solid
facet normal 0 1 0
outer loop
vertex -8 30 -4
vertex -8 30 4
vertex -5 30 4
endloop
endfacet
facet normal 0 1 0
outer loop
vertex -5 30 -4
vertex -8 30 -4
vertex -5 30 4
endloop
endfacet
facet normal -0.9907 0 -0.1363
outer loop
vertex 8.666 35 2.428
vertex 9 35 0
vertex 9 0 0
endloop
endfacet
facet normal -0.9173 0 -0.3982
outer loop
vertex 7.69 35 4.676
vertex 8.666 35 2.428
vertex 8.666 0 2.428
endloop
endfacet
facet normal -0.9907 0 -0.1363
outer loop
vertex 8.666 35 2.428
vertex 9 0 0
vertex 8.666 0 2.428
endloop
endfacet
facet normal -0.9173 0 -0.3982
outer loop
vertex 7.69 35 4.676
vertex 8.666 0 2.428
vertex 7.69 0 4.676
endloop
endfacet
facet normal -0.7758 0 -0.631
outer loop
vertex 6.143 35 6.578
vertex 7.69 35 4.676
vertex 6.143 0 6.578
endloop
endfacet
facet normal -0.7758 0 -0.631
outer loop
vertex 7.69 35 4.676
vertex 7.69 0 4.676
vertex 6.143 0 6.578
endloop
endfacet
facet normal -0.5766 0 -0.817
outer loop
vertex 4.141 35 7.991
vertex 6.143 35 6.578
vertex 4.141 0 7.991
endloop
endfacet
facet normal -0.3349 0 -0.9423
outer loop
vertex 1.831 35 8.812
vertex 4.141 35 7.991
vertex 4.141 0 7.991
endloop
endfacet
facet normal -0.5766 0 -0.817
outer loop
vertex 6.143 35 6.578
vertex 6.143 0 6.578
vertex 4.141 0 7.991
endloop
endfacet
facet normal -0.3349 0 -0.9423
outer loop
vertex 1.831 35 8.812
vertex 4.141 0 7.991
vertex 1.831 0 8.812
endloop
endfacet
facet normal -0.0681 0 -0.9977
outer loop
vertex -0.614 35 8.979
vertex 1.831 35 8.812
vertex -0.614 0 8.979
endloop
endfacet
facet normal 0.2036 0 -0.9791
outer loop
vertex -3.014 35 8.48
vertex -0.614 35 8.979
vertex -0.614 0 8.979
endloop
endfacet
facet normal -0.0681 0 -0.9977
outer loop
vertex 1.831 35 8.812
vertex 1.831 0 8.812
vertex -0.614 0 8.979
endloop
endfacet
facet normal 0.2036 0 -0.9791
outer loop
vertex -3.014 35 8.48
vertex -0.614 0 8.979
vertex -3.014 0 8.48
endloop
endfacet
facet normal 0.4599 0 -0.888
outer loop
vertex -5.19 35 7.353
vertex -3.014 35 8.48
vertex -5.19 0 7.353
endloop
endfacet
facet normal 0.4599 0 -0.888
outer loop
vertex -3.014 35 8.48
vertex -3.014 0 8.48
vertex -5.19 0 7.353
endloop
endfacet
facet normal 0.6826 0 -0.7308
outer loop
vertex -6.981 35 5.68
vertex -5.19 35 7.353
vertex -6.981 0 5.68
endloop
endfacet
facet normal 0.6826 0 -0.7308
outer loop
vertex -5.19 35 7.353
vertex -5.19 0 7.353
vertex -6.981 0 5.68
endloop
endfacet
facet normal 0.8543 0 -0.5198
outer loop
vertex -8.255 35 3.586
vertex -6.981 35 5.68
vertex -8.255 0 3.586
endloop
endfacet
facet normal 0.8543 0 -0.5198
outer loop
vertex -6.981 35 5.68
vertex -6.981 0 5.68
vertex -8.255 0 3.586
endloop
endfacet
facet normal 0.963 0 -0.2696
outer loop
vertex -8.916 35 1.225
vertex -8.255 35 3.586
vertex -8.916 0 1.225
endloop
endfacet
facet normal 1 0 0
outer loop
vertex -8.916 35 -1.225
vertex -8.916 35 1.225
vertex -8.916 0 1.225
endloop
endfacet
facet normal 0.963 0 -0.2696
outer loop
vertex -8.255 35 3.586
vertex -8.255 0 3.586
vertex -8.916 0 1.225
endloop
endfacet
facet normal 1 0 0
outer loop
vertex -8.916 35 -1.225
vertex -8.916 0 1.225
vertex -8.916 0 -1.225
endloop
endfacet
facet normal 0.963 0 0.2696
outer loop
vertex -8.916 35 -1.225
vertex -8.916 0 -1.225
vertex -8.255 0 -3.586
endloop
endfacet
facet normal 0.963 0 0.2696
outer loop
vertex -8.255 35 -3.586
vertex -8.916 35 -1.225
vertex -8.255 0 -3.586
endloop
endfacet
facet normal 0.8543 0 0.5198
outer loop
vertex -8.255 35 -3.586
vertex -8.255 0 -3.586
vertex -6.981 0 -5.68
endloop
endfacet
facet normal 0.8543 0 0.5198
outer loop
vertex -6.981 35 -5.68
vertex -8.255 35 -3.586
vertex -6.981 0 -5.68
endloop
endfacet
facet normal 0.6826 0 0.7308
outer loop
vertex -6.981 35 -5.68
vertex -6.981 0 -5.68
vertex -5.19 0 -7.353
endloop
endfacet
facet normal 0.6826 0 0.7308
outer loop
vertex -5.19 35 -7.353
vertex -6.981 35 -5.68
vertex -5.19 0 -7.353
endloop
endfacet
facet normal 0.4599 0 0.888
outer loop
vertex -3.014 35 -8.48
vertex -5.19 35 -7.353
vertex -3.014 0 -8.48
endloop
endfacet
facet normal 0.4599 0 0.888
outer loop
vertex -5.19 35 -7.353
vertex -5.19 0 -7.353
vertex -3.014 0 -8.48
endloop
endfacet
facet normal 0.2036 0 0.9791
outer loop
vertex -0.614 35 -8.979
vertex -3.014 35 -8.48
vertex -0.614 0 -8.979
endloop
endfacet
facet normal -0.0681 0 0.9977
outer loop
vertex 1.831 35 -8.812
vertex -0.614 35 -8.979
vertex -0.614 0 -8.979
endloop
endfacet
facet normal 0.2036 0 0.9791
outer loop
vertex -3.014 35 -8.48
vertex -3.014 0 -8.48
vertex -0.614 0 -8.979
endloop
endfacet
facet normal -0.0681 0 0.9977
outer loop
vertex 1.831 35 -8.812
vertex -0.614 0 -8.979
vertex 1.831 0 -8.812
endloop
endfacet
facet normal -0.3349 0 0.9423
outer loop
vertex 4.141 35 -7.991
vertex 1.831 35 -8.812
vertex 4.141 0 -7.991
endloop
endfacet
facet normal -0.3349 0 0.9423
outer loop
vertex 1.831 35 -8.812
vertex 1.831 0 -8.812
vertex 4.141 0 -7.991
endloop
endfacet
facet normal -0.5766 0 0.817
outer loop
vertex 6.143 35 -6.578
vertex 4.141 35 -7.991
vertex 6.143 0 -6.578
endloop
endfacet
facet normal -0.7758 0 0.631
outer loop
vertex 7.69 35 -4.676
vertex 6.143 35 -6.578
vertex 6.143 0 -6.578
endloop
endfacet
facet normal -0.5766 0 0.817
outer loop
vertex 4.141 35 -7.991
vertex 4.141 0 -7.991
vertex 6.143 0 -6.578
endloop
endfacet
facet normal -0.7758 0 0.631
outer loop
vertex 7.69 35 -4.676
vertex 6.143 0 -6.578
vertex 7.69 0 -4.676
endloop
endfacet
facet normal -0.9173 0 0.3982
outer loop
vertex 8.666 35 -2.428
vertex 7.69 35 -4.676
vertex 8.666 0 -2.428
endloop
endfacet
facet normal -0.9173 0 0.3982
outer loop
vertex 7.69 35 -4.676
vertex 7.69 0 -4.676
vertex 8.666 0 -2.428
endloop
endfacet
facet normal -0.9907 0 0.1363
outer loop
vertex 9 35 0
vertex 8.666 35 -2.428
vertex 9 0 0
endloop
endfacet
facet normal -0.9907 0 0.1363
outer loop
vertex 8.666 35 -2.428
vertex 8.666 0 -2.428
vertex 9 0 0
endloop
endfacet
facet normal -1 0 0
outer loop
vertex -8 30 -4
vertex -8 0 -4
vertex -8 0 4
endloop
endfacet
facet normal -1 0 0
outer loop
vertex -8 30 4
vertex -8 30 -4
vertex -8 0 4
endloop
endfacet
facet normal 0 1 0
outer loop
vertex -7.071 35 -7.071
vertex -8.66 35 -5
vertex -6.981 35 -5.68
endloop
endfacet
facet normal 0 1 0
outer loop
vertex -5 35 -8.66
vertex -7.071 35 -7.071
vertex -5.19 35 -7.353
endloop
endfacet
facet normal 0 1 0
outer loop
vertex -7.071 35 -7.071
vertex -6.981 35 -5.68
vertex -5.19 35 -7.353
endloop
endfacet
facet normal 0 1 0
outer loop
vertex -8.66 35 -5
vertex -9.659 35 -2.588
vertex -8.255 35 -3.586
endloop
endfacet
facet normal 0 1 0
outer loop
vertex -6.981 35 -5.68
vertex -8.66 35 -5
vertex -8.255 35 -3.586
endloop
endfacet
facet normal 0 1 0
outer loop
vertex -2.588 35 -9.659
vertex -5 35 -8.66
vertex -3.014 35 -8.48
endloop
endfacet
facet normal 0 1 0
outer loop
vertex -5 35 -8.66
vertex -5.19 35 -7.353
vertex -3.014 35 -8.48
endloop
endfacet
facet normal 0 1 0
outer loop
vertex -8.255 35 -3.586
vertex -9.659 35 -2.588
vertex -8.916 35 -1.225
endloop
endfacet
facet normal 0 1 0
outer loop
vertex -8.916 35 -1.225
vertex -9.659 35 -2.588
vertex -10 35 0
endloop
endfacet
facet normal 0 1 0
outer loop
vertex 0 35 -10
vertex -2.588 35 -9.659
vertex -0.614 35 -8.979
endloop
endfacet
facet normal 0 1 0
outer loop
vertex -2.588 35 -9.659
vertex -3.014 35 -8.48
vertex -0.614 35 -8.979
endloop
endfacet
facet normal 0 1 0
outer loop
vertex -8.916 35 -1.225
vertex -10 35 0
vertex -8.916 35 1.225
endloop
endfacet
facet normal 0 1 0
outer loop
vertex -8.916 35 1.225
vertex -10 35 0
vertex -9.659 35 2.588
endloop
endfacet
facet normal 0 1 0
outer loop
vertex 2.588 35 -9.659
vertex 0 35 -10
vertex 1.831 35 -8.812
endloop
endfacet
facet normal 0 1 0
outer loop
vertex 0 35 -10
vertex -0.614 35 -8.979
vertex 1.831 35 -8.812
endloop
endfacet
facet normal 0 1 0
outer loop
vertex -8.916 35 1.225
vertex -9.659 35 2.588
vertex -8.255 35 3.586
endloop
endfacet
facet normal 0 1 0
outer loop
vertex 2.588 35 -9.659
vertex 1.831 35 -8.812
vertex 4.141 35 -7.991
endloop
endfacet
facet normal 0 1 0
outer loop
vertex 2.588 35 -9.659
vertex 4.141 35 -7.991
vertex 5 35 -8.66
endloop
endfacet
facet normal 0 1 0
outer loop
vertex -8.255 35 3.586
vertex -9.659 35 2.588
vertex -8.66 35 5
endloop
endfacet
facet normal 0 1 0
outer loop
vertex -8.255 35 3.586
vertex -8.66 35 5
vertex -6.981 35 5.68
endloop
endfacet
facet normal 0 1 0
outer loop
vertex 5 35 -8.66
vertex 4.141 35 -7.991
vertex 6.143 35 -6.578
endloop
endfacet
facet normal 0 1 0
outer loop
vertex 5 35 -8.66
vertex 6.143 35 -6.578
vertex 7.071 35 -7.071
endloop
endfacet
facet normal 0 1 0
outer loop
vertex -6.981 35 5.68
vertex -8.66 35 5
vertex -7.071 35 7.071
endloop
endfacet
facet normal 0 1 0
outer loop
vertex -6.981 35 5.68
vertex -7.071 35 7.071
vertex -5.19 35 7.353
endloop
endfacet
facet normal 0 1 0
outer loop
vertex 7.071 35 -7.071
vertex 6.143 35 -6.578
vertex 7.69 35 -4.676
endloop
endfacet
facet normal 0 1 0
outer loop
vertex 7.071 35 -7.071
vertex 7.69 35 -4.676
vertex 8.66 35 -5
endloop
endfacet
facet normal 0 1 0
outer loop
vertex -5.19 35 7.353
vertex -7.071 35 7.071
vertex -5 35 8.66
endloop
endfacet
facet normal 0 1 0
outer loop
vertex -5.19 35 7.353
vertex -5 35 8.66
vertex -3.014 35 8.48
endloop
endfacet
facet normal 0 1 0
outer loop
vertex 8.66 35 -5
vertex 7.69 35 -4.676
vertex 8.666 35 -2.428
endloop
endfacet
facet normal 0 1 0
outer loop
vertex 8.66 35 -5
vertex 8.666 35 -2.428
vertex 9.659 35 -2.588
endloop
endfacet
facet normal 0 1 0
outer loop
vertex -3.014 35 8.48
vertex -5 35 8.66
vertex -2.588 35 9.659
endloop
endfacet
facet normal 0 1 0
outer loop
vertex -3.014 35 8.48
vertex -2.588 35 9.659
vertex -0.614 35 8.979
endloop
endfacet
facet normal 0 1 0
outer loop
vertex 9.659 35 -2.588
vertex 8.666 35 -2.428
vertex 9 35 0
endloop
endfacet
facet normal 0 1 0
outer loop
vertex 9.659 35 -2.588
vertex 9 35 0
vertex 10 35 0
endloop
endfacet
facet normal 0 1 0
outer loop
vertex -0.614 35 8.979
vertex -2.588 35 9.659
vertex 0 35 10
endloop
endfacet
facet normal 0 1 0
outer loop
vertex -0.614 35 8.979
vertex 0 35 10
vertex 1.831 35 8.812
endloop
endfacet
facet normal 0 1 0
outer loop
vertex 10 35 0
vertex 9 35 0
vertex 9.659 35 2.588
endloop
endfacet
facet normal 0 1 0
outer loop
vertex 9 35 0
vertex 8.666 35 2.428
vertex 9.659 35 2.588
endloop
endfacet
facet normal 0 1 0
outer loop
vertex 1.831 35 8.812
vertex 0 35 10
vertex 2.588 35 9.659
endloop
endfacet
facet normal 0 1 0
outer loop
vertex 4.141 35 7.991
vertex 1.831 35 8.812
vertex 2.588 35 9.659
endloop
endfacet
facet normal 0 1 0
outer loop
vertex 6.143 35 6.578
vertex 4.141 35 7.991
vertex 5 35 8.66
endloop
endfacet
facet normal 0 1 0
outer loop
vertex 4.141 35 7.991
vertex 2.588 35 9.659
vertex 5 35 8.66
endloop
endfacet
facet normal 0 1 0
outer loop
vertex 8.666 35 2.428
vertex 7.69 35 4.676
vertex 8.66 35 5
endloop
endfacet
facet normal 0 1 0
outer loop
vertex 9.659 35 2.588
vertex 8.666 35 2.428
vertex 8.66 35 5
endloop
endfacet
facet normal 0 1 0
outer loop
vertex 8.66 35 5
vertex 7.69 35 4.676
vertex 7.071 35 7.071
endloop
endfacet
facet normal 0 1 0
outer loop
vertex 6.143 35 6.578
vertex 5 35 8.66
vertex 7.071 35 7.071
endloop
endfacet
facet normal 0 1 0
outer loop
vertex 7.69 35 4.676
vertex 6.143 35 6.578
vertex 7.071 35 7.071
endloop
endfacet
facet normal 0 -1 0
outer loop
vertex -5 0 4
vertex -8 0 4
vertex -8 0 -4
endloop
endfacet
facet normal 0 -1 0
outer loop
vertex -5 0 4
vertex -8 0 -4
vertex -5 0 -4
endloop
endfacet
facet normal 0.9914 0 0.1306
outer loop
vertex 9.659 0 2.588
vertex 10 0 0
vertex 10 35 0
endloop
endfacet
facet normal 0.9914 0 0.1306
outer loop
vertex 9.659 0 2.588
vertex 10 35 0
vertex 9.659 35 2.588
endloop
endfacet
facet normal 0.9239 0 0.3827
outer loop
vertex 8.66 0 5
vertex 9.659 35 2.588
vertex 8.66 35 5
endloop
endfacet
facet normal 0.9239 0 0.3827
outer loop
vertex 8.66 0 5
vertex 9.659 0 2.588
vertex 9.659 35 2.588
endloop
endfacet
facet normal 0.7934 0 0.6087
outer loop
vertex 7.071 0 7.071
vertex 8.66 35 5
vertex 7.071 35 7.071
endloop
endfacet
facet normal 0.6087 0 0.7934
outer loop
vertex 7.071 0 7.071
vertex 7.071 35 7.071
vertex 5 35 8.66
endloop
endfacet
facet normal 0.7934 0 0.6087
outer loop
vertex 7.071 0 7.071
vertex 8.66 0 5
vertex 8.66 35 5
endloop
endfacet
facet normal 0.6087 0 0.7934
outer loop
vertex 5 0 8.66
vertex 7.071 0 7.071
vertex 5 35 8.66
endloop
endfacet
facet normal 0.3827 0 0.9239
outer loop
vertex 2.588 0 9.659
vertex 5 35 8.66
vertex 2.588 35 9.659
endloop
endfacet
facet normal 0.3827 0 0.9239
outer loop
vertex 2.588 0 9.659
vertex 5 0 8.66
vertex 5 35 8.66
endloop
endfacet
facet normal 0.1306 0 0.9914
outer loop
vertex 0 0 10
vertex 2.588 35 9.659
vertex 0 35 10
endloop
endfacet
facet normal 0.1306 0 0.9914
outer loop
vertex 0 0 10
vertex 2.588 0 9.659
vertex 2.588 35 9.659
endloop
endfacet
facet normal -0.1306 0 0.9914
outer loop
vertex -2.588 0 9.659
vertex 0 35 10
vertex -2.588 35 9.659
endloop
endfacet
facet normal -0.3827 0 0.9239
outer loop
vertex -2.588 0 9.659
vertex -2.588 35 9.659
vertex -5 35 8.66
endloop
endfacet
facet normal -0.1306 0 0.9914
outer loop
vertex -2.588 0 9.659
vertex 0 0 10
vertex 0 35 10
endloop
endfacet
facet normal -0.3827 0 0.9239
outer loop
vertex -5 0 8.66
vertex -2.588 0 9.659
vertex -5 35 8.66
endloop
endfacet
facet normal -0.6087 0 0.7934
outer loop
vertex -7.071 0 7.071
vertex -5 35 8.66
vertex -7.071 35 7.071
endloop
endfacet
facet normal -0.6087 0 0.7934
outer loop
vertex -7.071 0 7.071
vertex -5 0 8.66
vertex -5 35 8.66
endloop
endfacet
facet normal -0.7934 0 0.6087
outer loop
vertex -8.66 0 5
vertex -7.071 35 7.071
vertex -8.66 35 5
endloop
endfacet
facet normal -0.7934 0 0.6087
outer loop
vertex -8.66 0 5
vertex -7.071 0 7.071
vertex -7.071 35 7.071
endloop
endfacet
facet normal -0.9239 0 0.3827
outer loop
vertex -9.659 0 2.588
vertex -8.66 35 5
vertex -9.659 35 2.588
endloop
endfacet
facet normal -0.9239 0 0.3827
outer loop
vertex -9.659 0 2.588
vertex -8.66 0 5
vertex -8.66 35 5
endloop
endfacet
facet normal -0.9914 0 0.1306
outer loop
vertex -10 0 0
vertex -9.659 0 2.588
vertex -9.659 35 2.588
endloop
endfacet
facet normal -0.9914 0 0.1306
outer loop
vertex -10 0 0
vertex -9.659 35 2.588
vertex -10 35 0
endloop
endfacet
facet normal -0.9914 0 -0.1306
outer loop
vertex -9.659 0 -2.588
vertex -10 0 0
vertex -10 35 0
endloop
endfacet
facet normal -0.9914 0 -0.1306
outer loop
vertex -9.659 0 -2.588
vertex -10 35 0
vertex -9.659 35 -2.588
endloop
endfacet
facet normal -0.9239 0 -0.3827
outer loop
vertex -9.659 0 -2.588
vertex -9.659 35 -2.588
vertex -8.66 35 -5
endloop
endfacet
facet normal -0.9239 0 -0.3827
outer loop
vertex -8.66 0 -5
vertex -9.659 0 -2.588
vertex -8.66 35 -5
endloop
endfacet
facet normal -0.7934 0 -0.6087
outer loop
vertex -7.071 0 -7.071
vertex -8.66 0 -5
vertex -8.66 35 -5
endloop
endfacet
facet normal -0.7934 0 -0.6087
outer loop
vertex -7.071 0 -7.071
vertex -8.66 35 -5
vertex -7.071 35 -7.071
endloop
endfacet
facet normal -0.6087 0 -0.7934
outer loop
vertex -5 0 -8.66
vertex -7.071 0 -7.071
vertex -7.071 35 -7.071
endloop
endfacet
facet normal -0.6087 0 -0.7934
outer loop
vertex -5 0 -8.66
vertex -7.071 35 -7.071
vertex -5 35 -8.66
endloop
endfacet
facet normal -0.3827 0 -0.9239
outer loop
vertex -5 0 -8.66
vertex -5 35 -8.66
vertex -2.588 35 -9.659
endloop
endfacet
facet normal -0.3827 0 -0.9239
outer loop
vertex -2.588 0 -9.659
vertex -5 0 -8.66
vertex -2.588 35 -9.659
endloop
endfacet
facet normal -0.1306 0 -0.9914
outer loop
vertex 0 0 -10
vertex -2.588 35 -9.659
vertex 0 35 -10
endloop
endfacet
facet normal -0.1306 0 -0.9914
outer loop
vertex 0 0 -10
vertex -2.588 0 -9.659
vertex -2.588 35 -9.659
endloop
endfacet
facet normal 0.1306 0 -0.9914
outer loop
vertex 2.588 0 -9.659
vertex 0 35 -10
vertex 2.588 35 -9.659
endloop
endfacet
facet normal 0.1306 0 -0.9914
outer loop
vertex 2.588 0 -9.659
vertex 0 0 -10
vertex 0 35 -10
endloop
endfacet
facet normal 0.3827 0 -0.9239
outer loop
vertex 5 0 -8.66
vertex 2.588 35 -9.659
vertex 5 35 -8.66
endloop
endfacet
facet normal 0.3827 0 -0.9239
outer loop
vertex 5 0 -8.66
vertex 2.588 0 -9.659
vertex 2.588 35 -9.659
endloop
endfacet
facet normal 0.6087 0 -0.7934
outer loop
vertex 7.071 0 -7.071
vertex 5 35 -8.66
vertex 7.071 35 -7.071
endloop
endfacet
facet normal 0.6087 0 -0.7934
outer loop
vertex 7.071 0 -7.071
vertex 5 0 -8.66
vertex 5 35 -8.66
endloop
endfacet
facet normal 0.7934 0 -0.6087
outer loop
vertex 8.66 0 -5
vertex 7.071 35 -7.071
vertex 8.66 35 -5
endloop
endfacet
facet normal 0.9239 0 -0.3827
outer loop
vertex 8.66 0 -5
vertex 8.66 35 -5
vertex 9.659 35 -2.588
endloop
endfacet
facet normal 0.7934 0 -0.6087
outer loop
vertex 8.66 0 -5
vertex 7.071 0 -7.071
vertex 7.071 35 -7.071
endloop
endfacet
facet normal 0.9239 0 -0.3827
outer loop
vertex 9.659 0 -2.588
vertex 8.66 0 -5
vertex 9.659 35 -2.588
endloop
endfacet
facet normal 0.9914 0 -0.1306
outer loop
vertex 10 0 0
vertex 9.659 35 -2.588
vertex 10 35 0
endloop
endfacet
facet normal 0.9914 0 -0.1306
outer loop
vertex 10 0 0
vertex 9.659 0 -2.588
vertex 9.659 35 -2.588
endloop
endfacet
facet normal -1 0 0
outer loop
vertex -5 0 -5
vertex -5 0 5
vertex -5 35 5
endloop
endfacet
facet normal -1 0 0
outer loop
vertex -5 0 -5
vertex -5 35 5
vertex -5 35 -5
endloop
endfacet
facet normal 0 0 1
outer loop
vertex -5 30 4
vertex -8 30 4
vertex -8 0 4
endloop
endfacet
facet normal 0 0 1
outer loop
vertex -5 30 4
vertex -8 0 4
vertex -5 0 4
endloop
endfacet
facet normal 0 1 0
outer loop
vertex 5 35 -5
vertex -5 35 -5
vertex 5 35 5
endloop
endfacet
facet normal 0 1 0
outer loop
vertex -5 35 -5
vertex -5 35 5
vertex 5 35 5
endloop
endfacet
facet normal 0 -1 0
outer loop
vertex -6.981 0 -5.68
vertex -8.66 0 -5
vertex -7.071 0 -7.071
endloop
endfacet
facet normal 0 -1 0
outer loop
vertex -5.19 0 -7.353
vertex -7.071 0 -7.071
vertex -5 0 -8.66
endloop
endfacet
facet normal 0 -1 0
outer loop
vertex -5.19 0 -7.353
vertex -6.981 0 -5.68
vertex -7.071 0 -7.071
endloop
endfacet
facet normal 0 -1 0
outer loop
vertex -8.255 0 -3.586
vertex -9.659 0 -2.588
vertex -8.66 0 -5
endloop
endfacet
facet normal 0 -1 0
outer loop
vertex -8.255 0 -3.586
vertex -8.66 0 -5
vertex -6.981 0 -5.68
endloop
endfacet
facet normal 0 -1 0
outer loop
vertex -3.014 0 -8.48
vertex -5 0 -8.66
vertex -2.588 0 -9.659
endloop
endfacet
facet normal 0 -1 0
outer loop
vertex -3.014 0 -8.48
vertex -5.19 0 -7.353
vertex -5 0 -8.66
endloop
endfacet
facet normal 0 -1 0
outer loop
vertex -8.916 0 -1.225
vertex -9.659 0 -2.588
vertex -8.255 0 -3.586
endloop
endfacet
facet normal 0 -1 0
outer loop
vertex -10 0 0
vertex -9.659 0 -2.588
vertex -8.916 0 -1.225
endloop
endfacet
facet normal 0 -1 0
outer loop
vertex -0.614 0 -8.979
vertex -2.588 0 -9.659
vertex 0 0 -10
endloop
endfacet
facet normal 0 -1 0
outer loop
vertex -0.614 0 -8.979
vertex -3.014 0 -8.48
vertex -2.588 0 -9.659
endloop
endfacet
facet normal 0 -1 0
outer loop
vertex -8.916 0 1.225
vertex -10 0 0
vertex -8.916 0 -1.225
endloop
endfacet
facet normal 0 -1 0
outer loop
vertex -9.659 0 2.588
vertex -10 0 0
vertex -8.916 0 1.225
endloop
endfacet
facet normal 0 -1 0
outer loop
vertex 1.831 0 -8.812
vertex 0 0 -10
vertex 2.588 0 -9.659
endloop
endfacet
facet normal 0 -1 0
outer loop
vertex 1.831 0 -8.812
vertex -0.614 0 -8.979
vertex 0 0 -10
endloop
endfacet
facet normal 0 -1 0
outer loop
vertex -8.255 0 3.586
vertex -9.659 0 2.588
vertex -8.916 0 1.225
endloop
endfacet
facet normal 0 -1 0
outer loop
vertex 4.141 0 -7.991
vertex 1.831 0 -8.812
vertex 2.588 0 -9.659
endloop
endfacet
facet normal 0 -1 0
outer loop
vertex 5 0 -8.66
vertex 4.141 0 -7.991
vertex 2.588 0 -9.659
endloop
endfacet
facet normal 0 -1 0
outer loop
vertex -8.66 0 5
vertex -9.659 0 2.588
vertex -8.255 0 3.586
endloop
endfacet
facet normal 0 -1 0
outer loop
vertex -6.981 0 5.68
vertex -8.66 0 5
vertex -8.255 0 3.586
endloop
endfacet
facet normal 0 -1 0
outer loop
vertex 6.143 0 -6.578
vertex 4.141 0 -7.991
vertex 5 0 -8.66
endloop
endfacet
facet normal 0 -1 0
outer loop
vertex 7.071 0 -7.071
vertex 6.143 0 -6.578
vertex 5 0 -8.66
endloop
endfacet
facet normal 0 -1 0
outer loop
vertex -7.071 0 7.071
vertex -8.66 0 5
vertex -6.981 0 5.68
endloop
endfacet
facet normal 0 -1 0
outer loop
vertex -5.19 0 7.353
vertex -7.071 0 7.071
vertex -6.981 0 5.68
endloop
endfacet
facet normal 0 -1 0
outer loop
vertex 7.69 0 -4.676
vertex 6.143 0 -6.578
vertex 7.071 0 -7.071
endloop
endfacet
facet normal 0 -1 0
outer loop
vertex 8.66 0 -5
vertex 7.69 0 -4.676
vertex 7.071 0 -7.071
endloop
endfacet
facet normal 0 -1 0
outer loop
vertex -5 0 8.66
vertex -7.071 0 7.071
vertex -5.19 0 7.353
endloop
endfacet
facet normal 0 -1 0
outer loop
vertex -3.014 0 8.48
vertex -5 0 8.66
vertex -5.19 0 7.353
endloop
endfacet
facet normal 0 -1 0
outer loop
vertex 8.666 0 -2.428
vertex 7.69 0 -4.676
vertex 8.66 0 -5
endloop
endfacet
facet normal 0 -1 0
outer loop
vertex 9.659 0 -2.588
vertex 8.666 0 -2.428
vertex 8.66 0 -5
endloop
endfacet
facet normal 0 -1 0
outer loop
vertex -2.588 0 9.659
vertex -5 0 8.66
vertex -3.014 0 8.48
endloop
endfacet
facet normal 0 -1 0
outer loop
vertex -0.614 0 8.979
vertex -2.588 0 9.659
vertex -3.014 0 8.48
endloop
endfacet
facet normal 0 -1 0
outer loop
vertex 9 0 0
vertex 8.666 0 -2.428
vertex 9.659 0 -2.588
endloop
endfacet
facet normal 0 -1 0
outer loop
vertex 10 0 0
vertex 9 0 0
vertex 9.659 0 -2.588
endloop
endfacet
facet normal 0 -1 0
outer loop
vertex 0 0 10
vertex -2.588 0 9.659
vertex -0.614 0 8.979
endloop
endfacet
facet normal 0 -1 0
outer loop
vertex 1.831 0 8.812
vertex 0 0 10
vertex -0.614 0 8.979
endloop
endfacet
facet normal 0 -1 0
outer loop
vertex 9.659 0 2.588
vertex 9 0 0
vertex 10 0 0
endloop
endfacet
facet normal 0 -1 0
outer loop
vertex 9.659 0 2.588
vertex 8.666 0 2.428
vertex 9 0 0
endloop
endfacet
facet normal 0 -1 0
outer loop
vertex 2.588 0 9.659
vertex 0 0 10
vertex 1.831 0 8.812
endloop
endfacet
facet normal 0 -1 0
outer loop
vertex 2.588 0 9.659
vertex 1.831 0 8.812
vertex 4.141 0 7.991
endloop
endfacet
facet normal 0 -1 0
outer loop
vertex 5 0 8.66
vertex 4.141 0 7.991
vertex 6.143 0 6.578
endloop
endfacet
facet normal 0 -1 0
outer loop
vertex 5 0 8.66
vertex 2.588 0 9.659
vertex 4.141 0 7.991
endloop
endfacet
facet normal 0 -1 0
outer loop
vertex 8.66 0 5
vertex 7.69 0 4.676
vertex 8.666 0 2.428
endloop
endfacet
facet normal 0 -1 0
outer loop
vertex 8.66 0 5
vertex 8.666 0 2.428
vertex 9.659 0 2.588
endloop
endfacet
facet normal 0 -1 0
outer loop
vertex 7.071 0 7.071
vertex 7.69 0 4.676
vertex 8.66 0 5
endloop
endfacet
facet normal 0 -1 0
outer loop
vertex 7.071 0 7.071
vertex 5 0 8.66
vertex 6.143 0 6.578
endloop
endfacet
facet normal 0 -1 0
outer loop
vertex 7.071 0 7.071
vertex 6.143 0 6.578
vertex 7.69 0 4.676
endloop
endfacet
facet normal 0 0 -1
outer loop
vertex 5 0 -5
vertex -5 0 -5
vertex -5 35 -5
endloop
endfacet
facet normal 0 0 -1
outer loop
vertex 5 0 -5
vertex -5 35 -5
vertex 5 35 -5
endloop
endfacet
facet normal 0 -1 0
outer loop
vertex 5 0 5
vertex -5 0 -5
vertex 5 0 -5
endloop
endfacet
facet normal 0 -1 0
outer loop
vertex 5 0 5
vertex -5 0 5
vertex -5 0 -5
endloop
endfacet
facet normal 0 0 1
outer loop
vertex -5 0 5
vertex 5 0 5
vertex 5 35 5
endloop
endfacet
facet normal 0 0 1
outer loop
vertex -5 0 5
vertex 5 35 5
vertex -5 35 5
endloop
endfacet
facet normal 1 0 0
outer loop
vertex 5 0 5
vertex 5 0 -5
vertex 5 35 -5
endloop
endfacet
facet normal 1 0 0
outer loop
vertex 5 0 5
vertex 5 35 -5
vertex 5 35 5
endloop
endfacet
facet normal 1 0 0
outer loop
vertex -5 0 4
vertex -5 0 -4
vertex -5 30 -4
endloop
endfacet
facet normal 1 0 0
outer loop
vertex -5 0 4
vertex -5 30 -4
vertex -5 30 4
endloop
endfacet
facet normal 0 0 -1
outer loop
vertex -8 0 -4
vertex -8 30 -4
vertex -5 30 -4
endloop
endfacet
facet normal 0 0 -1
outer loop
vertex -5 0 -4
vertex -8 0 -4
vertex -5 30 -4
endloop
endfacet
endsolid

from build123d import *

# Parameters (mm, degrees)
F1_DEPTH = 35
F0_R     = 10
F0_R_2   = 9
F2_DEPTH = 35
F0_W     = 3
F0_H     = 8
F3_DEPTH = 30


with BuildPart() as f1:
    # F0 (on Front) → F1 (new body)
    with BuildSketch(Plane.XZ):
        Polygon((-5, -5), (5, -5), (5, 5), (-5, 5), (-5, 4), (-5, -4), align=None)
    extrude(amount=-F1_DEPTH)


with BuildPart() as f2:
    # F0 (on Front) → F2 (new body)
    with BuildSketch(Plane.XZ):
        Circle(F0_R)
        Circle(F0_R_2, mode=Mode.SUBTRACT)
    extrude(amount=-F2_DEPTH)


with BuildPart() as f3:
    # F0 (on Front) → F3 (new body)
    with BuildSketch(Plane.XZ):
        with Locations((-6.5, 0)):
            Rectangle(F0_W, F0_H)
    extrude(amount=-F3_DEPTH)


solid = Compound([f1.part, f2.part, f3.part])
